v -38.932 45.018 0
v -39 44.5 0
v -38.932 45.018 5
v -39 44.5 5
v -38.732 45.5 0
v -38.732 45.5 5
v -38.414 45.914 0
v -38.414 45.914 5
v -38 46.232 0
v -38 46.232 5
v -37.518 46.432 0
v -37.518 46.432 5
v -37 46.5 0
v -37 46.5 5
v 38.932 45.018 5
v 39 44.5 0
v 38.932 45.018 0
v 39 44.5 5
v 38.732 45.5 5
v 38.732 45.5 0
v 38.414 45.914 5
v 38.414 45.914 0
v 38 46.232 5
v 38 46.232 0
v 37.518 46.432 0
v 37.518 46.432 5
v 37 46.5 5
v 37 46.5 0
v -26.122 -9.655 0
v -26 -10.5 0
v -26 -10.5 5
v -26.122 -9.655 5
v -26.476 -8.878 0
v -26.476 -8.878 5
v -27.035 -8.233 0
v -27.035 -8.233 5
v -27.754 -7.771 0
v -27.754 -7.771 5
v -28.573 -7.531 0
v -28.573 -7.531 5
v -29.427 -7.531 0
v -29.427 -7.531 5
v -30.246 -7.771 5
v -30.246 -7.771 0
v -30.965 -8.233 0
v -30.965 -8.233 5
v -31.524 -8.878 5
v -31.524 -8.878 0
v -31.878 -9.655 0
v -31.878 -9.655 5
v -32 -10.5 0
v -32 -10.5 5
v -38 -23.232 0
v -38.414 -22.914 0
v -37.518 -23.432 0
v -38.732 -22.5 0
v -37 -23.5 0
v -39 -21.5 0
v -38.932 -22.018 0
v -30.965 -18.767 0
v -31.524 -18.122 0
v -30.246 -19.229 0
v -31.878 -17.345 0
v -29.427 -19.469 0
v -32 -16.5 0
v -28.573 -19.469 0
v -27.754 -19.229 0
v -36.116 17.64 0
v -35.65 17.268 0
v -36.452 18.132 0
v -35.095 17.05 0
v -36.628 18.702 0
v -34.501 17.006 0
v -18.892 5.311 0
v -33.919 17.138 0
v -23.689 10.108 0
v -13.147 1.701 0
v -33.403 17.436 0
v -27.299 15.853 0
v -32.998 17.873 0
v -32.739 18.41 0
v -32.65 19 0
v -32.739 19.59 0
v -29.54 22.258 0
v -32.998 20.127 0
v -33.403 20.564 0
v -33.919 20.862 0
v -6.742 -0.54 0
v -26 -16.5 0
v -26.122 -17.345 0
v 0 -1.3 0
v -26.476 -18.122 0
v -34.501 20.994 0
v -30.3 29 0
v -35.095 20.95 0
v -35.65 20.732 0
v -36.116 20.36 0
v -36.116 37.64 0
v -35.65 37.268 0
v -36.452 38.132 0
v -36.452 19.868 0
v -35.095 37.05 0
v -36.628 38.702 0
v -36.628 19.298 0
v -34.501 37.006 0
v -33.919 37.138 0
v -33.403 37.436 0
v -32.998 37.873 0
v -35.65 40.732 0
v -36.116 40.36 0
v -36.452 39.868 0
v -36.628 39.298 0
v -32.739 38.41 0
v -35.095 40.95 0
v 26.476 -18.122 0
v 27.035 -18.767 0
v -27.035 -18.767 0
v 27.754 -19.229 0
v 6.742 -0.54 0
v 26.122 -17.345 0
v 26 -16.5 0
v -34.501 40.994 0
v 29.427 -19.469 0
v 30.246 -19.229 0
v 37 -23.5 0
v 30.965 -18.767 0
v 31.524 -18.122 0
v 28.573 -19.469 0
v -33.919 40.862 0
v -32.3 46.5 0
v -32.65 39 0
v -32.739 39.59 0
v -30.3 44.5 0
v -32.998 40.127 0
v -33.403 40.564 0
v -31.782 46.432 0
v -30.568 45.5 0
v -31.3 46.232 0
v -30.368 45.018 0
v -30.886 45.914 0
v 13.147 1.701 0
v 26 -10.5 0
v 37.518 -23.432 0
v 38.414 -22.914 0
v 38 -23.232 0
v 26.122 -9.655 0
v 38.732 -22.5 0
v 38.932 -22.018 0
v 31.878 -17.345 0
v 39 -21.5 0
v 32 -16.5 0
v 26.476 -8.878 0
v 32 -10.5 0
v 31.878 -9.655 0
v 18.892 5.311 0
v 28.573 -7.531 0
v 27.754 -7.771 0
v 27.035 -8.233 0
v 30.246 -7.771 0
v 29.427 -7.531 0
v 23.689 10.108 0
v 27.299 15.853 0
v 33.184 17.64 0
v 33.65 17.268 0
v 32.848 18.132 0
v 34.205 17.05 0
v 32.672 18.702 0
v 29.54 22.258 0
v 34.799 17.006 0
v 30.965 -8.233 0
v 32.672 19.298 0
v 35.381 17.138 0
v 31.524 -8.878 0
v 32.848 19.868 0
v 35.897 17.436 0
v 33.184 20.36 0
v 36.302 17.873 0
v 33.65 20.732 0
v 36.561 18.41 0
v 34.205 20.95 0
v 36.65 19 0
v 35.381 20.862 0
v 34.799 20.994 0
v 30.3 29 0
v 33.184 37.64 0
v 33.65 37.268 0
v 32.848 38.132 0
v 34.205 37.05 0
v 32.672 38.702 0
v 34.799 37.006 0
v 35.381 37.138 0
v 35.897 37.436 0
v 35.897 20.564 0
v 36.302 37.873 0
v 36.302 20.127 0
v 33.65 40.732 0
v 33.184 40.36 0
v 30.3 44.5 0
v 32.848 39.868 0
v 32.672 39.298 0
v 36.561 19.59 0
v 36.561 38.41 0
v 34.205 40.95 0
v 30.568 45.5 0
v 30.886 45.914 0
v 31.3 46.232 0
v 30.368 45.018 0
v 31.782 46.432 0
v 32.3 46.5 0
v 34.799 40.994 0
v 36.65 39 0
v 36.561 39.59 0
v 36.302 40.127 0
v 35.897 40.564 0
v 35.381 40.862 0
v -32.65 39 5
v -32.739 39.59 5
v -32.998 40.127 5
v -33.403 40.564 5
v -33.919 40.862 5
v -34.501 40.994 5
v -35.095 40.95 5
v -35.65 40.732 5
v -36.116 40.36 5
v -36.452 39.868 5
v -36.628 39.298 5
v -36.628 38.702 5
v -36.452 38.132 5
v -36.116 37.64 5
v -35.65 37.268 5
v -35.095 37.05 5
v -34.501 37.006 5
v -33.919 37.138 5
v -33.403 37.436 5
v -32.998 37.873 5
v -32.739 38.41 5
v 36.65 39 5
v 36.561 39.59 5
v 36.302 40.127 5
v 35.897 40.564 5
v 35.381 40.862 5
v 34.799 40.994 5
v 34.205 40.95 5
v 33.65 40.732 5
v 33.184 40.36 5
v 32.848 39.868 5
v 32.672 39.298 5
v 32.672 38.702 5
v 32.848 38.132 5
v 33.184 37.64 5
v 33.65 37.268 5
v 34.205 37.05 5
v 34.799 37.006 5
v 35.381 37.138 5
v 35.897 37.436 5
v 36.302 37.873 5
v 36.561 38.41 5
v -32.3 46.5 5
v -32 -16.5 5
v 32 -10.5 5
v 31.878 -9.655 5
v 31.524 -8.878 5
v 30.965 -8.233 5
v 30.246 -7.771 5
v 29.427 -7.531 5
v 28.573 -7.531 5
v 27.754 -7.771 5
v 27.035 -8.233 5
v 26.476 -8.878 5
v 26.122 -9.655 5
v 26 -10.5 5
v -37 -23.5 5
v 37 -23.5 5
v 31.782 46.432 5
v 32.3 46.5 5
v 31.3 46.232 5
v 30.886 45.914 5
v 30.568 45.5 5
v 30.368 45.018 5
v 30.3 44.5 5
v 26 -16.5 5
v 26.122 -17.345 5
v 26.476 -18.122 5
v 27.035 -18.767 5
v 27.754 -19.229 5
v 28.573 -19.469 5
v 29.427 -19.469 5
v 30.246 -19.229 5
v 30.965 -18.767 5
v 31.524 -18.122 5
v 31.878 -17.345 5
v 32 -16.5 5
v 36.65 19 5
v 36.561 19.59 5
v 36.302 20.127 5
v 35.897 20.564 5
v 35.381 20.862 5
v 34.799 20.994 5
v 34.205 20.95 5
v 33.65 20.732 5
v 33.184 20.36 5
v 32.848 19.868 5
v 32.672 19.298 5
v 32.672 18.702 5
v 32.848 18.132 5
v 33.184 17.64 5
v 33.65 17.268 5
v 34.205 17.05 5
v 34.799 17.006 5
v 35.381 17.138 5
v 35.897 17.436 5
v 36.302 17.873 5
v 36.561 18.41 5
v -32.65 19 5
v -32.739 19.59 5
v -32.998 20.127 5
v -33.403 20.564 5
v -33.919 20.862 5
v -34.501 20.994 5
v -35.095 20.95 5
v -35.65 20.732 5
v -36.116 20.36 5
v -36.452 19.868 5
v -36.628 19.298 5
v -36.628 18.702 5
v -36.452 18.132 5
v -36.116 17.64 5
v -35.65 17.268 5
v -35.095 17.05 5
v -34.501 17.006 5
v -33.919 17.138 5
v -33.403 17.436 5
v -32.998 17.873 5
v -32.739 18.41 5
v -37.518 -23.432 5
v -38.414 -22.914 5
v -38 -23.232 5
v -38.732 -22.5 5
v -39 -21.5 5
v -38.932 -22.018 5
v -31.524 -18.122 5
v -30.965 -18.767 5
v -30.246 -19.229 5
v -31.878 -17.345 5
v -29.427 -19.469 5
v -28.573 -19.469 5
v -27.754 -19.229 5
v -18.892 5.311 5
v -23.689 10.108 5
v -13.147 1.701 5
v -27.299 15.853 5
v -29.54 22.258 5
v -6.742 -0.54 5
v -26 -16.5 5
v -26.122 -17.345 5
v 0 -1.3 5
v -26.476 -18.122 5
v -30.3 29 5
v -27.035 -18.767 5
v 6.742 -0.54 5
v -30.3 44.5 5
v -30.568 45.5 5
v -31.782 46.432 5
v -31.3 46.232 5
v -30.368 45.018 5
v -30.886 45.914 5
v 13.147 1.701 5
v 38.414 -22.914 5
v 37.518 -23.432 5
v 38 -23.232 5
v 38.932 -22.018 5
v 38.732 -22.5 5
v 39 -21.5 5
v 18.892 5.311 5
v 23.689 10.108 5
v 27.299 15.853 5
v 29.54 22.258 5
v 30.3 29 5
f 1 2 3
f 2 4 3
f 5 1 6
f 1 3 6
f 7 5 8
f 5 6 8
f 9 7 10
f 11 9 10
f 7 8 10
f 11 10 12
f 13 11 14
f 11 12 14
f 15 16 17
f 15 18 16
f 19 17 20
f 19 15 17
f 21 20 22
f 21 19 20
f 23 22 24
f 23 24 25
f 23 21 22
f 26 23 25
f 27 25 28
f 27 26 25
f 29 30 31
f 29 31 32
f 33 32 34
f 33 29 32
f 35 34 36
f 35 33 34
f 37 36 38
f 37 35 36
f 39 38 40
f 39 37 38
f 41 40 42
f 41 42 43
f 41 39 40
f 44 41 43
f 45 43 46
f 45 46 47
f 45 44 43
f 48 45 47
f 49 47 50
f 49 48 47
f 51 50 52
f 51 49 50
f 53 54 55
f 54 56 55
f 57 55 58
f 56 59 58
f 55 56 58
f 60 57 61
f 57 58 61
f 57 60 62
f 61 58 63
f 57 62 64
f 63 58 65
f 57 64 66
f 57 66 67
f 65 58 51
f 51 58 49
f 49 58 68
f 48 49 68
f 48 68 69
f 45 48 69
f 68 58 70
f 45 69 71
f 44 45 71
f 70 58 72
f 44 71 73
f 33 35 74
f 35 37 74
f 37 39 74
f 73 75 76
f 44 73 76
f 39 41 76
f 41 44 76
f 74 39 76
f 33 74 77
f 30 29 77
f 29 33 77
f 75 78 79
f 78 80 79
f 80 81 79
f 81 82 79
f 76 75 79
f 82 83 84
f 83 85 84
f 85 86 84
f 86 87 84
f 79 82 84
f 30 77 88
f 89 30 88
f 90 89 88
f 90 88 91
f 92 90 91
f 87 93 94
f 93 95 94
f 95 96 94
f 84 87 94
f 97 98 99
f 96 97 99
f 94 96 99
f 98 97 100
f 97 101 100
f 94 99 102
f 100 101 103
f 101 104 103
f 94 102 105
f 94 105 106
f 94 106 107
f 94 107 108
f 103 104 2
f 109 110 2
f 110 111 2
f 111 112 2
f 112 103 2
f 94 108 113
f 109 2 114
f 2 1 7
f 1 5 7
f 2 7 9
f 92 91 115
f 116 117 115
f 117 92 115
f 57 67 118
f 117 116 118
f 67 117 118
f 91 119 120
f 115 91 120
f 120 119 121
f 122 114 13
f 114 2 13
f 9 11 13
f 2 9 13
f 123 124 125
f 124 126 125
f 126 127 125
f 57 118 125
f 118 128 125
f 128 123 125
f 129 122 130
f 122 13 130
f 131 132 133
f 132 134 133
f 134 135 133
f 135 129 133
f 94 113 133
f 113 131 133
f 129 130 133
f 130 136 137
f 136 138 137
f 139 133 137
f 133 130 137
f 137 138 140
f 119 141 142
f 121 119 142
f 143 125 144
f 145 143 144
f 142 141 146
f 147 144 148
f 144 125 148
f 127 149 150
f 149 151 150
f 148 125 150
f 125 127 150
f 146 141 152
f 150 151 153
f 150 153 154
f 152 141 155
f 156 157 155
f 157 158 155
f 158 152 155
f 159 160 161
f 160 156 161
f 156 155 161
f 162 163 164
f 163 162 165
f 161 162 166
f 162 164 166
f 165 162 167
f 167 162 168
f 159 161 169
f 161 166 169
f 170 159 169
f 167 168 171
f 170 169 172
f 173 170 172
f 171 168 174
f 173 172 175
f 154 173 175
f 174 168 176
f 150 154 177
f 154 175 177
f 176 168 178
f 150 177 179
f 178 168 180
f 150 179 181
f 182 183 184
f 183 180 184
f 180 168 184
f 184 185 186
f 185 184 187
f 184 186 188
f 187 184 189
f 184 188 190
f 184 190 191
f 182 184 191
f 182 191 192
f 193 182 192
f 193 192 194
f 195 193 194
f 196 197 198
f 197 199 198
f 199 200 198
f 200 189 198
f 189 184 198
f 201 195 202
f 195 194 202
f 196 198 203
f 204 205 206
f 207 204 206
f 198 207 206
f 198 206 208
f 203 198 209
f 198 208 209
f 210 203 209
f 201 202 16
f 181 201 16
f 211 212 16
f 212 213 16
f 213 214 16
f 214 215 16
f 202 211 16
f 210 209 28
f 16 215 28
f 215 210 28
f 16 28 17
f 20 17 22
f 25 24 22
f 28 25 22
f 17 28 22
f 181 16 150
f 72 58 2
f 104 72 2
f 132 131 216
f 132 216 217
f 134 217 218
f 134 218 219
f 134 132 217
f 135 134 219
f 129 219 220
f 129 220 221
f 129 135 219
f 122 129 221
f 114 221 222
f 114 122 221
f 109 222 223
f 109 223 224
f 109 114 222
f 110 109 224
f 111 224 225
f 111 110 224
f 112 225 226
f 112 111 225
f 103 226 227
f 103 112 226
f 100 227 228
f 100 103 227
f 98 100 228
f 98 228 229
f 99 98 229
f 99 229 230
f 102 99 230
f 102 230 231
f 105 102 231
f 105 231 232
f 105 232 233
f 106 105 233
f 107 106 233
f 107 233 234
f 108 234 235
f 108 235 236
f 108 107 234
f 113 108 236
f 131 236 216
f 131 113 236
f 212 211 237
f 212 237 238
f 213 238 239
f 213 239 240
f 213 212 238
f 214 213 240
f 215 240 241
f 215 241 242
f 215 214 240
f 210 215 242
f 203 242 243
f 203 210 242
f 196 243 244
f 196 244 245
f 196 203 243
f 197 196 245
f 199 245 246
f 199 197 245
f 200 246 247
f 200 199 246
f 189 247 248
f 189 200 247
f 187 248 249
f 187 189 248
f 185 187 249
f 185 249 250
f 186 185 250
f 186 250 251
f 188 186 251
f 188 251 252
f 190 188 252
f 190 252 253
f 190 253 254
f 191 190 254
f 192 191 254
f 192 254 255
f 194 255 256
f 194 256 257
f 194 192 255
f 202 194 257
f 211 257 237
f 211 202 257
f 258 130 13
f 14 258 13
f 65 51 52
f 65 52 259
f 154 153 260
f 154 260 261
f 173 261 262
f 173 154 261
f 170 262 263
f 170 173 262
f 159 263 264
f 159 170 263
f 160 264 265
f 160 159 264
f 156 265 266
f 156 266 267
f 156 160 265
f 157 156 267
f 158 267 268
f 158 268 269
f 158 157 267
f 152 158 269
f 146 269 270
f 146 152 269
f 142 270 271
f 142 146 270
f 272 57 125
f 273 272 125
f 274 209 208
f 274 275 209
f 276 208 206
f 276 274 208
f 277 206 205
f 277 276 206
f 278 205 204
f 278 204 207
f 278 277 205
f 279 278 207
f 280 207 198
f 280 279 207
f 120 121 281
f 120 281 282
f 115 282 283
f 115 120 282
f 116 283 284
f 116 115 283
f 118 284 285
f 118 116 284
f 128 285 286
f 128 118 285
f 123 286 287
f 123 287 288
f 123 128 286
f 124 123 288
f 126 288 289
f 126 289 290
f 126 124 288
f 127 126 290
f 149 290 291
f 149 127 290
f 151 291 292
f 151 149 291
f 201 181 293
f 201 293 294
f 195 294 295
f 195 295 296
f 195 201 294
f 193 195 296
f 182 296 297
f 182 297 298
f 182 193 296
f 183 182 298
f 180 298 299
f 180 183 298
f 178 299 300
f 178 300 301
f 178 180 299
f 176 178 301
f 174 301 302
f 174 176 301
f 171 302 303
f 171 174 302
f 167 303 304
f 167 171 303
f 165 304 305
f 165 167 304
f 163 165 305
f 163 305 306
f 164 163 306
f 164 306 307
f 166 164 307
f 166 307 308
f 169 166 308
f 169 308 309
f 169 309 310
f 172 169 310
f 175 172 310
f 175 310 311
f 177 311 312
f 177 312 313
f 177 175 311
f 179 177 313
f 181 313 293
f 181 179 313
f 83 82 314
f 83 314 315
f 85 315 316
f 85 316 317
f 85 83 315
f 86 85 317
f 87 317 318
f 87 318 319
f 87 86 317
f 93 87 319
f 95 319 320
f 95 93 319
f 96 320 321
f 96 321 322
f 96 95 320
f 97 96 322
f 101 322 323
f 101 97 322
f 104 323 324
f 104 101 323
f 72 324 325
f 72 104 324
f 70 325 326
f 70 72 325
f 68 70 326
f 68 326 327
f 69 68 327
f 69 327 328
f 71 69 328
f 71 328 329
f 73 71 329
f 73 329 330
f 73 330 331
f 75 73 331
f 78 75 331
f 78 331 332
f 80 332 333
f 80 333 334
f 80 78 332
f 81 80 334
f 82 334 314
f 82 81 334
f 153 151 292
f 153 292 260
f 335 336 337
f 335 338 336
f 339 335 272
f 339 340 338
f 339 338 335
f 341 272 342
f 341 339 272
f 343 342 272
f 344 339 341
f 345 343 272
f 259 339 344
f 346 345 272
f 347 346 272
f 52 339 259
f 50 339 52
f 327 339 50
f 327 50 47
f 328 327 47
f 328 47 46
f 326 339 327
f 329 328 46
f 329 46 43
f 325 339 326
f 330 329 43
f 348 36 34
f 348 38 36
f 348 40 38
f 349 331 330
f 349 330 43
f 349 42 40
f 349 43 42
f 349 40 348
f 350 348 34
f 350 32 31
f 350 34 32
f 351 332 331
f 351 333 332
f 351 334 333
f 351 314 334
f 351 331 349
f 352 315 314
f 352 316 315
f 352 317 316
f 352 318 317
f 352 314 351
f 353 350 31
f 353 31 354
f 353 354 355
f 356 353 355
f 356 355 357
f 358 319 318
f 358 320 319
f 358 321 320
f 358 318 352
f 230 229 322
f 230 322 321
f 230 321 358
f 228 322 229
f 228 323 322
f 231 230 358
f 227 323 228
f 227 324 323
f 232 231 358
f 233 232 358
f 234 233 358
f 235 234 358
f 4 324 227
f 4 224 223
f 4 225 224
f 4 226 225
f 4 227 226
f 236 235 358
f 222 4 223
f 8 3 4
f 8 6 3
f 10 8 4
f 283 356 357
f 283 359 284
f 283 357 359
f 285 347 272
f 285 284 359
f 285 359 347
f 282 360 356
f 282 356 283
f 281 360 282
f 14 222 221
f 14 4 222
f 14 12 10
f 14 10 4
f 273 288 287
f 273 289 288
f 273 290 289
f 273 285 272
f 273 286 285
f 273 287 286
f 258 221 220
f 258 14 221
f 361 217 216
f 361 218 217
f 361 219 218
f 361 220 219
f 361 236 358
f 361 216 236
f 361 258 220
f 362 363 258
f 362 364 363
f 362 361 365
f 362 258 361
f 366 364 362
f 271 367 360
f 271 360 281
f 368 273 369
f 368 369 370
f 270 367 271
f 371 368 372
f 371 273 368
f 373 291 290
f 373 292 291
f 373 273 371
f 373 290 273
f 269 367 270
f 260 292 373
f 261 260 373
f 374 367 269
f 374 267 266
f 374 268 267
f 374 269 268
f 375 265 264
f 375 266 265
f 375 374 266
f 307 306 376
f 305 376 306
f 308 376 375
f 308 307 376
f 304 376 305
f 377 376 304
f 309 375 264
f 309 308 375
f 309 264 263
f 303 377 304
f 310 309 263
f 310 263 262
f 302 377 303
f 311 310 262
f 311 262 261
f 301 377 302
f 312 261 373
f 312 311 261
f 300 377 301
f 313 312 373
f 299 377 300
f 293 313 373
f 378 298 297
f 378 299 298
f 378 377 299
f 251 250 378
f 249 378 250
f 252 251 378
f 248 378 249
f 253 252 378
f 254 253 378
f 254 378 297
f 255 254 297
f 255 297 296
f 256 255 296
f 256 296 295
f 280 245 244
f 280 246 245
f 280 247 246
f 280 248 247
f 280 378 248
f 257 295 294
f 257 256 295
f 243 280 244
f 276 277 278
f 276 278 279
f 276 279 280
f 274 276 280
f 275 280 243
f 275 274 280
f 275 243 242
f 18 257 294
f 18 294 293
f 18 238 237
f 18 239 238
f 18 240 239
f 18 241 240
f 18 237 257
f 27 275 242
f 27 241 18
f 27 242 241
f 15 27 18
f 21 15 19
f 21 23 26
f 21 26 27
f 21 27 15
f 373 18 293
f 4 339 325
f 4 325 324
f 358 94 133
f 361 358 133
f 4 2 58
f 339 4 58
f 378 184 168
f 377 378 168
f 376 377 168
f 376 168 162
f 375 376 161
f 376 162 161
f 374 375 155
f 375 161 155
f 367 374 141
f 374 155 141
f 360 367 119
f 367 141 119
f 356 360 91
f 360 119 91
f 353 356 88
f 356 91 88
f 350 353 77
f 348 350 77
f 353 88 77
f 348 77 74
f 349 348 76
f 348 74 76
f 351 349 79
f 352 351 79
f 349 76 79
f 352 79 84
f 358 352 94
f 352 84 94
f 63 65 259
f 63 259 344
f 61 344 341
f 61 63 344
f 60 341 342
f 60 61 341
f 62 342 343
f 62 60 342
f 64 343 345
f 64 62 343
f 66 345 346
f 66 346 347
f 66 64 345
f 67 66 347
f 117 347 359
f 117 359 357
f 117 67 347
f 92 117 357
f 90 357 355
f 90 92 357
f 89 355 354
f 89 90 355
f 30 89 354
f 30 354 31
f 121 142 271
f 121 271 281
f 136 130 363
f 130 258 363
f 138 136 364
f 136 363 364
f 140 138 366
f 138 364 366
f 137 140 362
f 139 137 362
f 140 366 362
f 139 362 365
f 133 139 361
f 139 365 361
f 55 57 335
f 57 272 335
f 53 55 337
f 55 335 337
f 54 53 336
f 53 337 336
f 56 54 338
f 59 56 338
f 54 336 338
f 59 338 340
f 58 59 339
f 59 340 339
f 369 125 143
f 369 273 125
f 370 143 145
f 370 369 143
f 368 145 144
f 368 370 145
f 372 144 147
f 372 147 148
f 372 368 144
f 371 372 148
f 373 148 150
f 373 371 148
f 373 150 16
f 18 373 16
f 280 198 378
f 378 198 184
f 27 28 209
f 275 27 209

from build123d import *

# Parameters (mm, degrees)
SKETCH_1_R      = 2
EXTRUDE_1_DEPTH = 5
FILLET_2_R      = 2


with BuildPart() as part:
    # 草图1 → 凸台-拉伸1 (new body)
    with BuildSketch(Plane.XY):
        with BuildLine():
            Line((-39, -23.5), (39, -23.5))
            Line((39, -23.5), (39, 46.5))
            Line((39, 46.5), (30.3, 46.5))
            Line((30.3, 46.5), (30.3, 29))
            ThreePointArc((30.3, 29), (0, -1.3), (-30.3, 29))
            Line((-30.3, 29), (-30.3, 46.5))
            Line((-30.3, 46.5), (-39, 46.5))
            Line((-39, 46.5), (-39, -23.5))
        make_face()
        with Locations((-34.65, 39)):
            Circle(SKETCH_1_R, mode=Mode.SUBTRACT)
        with Locations((-34.65, 19)):
            Circle(SKETCH_1_R, mode=Mode.SUBTRACT)
        with Locations((34.65, 19)):
            Circle(SKETCH_1_R, mode=Mode.SUBTRACT)
        with Locations((34.65, 39)):
            Circle(SKETCH_1_R, mode=Mode.SUBTRACT)
        with BuildLine():
            Line((-32, -10.5), (-32, -16.5))
            ThreePointArc((-32, -16.5), (-29, -19.5), (-26, -16.5))
            Line((-26, -16.5), (-26, -10.5))
            ThreePointArc((-26, -10.5), (-29, -7.5), (-32, -10.5))
        make_face(mode=Mode.SUBTRACT)
        with BuildLine():
            Line((26, -10.5), (26, -16.5))
            ThreePointArc((26, -16.5), (29, -19.5), (32, -16.5))
            Line((32, -16.5), (32, -10.5))
            ThreePointArc((32, -10.5), (29, -7.5), (26, -10.5))
        make_face(mode=Mode.SUBTRACT)
    extrude(amount=EXTRUDE_1_DEPTH)

    # 圆角2
    fillet_2_edges = [part.edges().sort_by_distance(p)[0] for p in [
        (30.3, 46.5, 2.5),
        (39, 46.5, 2.5),
        (39, -23.5, 2.5),
        (-39, -23.5, 2.5),
        (-39, 46.5, 2.5),
        (-30.3, 46.5, 2.5),
    ]]
    fillet(fillet_2_edges, radius=FILLET_2_R)


solid = part.part
